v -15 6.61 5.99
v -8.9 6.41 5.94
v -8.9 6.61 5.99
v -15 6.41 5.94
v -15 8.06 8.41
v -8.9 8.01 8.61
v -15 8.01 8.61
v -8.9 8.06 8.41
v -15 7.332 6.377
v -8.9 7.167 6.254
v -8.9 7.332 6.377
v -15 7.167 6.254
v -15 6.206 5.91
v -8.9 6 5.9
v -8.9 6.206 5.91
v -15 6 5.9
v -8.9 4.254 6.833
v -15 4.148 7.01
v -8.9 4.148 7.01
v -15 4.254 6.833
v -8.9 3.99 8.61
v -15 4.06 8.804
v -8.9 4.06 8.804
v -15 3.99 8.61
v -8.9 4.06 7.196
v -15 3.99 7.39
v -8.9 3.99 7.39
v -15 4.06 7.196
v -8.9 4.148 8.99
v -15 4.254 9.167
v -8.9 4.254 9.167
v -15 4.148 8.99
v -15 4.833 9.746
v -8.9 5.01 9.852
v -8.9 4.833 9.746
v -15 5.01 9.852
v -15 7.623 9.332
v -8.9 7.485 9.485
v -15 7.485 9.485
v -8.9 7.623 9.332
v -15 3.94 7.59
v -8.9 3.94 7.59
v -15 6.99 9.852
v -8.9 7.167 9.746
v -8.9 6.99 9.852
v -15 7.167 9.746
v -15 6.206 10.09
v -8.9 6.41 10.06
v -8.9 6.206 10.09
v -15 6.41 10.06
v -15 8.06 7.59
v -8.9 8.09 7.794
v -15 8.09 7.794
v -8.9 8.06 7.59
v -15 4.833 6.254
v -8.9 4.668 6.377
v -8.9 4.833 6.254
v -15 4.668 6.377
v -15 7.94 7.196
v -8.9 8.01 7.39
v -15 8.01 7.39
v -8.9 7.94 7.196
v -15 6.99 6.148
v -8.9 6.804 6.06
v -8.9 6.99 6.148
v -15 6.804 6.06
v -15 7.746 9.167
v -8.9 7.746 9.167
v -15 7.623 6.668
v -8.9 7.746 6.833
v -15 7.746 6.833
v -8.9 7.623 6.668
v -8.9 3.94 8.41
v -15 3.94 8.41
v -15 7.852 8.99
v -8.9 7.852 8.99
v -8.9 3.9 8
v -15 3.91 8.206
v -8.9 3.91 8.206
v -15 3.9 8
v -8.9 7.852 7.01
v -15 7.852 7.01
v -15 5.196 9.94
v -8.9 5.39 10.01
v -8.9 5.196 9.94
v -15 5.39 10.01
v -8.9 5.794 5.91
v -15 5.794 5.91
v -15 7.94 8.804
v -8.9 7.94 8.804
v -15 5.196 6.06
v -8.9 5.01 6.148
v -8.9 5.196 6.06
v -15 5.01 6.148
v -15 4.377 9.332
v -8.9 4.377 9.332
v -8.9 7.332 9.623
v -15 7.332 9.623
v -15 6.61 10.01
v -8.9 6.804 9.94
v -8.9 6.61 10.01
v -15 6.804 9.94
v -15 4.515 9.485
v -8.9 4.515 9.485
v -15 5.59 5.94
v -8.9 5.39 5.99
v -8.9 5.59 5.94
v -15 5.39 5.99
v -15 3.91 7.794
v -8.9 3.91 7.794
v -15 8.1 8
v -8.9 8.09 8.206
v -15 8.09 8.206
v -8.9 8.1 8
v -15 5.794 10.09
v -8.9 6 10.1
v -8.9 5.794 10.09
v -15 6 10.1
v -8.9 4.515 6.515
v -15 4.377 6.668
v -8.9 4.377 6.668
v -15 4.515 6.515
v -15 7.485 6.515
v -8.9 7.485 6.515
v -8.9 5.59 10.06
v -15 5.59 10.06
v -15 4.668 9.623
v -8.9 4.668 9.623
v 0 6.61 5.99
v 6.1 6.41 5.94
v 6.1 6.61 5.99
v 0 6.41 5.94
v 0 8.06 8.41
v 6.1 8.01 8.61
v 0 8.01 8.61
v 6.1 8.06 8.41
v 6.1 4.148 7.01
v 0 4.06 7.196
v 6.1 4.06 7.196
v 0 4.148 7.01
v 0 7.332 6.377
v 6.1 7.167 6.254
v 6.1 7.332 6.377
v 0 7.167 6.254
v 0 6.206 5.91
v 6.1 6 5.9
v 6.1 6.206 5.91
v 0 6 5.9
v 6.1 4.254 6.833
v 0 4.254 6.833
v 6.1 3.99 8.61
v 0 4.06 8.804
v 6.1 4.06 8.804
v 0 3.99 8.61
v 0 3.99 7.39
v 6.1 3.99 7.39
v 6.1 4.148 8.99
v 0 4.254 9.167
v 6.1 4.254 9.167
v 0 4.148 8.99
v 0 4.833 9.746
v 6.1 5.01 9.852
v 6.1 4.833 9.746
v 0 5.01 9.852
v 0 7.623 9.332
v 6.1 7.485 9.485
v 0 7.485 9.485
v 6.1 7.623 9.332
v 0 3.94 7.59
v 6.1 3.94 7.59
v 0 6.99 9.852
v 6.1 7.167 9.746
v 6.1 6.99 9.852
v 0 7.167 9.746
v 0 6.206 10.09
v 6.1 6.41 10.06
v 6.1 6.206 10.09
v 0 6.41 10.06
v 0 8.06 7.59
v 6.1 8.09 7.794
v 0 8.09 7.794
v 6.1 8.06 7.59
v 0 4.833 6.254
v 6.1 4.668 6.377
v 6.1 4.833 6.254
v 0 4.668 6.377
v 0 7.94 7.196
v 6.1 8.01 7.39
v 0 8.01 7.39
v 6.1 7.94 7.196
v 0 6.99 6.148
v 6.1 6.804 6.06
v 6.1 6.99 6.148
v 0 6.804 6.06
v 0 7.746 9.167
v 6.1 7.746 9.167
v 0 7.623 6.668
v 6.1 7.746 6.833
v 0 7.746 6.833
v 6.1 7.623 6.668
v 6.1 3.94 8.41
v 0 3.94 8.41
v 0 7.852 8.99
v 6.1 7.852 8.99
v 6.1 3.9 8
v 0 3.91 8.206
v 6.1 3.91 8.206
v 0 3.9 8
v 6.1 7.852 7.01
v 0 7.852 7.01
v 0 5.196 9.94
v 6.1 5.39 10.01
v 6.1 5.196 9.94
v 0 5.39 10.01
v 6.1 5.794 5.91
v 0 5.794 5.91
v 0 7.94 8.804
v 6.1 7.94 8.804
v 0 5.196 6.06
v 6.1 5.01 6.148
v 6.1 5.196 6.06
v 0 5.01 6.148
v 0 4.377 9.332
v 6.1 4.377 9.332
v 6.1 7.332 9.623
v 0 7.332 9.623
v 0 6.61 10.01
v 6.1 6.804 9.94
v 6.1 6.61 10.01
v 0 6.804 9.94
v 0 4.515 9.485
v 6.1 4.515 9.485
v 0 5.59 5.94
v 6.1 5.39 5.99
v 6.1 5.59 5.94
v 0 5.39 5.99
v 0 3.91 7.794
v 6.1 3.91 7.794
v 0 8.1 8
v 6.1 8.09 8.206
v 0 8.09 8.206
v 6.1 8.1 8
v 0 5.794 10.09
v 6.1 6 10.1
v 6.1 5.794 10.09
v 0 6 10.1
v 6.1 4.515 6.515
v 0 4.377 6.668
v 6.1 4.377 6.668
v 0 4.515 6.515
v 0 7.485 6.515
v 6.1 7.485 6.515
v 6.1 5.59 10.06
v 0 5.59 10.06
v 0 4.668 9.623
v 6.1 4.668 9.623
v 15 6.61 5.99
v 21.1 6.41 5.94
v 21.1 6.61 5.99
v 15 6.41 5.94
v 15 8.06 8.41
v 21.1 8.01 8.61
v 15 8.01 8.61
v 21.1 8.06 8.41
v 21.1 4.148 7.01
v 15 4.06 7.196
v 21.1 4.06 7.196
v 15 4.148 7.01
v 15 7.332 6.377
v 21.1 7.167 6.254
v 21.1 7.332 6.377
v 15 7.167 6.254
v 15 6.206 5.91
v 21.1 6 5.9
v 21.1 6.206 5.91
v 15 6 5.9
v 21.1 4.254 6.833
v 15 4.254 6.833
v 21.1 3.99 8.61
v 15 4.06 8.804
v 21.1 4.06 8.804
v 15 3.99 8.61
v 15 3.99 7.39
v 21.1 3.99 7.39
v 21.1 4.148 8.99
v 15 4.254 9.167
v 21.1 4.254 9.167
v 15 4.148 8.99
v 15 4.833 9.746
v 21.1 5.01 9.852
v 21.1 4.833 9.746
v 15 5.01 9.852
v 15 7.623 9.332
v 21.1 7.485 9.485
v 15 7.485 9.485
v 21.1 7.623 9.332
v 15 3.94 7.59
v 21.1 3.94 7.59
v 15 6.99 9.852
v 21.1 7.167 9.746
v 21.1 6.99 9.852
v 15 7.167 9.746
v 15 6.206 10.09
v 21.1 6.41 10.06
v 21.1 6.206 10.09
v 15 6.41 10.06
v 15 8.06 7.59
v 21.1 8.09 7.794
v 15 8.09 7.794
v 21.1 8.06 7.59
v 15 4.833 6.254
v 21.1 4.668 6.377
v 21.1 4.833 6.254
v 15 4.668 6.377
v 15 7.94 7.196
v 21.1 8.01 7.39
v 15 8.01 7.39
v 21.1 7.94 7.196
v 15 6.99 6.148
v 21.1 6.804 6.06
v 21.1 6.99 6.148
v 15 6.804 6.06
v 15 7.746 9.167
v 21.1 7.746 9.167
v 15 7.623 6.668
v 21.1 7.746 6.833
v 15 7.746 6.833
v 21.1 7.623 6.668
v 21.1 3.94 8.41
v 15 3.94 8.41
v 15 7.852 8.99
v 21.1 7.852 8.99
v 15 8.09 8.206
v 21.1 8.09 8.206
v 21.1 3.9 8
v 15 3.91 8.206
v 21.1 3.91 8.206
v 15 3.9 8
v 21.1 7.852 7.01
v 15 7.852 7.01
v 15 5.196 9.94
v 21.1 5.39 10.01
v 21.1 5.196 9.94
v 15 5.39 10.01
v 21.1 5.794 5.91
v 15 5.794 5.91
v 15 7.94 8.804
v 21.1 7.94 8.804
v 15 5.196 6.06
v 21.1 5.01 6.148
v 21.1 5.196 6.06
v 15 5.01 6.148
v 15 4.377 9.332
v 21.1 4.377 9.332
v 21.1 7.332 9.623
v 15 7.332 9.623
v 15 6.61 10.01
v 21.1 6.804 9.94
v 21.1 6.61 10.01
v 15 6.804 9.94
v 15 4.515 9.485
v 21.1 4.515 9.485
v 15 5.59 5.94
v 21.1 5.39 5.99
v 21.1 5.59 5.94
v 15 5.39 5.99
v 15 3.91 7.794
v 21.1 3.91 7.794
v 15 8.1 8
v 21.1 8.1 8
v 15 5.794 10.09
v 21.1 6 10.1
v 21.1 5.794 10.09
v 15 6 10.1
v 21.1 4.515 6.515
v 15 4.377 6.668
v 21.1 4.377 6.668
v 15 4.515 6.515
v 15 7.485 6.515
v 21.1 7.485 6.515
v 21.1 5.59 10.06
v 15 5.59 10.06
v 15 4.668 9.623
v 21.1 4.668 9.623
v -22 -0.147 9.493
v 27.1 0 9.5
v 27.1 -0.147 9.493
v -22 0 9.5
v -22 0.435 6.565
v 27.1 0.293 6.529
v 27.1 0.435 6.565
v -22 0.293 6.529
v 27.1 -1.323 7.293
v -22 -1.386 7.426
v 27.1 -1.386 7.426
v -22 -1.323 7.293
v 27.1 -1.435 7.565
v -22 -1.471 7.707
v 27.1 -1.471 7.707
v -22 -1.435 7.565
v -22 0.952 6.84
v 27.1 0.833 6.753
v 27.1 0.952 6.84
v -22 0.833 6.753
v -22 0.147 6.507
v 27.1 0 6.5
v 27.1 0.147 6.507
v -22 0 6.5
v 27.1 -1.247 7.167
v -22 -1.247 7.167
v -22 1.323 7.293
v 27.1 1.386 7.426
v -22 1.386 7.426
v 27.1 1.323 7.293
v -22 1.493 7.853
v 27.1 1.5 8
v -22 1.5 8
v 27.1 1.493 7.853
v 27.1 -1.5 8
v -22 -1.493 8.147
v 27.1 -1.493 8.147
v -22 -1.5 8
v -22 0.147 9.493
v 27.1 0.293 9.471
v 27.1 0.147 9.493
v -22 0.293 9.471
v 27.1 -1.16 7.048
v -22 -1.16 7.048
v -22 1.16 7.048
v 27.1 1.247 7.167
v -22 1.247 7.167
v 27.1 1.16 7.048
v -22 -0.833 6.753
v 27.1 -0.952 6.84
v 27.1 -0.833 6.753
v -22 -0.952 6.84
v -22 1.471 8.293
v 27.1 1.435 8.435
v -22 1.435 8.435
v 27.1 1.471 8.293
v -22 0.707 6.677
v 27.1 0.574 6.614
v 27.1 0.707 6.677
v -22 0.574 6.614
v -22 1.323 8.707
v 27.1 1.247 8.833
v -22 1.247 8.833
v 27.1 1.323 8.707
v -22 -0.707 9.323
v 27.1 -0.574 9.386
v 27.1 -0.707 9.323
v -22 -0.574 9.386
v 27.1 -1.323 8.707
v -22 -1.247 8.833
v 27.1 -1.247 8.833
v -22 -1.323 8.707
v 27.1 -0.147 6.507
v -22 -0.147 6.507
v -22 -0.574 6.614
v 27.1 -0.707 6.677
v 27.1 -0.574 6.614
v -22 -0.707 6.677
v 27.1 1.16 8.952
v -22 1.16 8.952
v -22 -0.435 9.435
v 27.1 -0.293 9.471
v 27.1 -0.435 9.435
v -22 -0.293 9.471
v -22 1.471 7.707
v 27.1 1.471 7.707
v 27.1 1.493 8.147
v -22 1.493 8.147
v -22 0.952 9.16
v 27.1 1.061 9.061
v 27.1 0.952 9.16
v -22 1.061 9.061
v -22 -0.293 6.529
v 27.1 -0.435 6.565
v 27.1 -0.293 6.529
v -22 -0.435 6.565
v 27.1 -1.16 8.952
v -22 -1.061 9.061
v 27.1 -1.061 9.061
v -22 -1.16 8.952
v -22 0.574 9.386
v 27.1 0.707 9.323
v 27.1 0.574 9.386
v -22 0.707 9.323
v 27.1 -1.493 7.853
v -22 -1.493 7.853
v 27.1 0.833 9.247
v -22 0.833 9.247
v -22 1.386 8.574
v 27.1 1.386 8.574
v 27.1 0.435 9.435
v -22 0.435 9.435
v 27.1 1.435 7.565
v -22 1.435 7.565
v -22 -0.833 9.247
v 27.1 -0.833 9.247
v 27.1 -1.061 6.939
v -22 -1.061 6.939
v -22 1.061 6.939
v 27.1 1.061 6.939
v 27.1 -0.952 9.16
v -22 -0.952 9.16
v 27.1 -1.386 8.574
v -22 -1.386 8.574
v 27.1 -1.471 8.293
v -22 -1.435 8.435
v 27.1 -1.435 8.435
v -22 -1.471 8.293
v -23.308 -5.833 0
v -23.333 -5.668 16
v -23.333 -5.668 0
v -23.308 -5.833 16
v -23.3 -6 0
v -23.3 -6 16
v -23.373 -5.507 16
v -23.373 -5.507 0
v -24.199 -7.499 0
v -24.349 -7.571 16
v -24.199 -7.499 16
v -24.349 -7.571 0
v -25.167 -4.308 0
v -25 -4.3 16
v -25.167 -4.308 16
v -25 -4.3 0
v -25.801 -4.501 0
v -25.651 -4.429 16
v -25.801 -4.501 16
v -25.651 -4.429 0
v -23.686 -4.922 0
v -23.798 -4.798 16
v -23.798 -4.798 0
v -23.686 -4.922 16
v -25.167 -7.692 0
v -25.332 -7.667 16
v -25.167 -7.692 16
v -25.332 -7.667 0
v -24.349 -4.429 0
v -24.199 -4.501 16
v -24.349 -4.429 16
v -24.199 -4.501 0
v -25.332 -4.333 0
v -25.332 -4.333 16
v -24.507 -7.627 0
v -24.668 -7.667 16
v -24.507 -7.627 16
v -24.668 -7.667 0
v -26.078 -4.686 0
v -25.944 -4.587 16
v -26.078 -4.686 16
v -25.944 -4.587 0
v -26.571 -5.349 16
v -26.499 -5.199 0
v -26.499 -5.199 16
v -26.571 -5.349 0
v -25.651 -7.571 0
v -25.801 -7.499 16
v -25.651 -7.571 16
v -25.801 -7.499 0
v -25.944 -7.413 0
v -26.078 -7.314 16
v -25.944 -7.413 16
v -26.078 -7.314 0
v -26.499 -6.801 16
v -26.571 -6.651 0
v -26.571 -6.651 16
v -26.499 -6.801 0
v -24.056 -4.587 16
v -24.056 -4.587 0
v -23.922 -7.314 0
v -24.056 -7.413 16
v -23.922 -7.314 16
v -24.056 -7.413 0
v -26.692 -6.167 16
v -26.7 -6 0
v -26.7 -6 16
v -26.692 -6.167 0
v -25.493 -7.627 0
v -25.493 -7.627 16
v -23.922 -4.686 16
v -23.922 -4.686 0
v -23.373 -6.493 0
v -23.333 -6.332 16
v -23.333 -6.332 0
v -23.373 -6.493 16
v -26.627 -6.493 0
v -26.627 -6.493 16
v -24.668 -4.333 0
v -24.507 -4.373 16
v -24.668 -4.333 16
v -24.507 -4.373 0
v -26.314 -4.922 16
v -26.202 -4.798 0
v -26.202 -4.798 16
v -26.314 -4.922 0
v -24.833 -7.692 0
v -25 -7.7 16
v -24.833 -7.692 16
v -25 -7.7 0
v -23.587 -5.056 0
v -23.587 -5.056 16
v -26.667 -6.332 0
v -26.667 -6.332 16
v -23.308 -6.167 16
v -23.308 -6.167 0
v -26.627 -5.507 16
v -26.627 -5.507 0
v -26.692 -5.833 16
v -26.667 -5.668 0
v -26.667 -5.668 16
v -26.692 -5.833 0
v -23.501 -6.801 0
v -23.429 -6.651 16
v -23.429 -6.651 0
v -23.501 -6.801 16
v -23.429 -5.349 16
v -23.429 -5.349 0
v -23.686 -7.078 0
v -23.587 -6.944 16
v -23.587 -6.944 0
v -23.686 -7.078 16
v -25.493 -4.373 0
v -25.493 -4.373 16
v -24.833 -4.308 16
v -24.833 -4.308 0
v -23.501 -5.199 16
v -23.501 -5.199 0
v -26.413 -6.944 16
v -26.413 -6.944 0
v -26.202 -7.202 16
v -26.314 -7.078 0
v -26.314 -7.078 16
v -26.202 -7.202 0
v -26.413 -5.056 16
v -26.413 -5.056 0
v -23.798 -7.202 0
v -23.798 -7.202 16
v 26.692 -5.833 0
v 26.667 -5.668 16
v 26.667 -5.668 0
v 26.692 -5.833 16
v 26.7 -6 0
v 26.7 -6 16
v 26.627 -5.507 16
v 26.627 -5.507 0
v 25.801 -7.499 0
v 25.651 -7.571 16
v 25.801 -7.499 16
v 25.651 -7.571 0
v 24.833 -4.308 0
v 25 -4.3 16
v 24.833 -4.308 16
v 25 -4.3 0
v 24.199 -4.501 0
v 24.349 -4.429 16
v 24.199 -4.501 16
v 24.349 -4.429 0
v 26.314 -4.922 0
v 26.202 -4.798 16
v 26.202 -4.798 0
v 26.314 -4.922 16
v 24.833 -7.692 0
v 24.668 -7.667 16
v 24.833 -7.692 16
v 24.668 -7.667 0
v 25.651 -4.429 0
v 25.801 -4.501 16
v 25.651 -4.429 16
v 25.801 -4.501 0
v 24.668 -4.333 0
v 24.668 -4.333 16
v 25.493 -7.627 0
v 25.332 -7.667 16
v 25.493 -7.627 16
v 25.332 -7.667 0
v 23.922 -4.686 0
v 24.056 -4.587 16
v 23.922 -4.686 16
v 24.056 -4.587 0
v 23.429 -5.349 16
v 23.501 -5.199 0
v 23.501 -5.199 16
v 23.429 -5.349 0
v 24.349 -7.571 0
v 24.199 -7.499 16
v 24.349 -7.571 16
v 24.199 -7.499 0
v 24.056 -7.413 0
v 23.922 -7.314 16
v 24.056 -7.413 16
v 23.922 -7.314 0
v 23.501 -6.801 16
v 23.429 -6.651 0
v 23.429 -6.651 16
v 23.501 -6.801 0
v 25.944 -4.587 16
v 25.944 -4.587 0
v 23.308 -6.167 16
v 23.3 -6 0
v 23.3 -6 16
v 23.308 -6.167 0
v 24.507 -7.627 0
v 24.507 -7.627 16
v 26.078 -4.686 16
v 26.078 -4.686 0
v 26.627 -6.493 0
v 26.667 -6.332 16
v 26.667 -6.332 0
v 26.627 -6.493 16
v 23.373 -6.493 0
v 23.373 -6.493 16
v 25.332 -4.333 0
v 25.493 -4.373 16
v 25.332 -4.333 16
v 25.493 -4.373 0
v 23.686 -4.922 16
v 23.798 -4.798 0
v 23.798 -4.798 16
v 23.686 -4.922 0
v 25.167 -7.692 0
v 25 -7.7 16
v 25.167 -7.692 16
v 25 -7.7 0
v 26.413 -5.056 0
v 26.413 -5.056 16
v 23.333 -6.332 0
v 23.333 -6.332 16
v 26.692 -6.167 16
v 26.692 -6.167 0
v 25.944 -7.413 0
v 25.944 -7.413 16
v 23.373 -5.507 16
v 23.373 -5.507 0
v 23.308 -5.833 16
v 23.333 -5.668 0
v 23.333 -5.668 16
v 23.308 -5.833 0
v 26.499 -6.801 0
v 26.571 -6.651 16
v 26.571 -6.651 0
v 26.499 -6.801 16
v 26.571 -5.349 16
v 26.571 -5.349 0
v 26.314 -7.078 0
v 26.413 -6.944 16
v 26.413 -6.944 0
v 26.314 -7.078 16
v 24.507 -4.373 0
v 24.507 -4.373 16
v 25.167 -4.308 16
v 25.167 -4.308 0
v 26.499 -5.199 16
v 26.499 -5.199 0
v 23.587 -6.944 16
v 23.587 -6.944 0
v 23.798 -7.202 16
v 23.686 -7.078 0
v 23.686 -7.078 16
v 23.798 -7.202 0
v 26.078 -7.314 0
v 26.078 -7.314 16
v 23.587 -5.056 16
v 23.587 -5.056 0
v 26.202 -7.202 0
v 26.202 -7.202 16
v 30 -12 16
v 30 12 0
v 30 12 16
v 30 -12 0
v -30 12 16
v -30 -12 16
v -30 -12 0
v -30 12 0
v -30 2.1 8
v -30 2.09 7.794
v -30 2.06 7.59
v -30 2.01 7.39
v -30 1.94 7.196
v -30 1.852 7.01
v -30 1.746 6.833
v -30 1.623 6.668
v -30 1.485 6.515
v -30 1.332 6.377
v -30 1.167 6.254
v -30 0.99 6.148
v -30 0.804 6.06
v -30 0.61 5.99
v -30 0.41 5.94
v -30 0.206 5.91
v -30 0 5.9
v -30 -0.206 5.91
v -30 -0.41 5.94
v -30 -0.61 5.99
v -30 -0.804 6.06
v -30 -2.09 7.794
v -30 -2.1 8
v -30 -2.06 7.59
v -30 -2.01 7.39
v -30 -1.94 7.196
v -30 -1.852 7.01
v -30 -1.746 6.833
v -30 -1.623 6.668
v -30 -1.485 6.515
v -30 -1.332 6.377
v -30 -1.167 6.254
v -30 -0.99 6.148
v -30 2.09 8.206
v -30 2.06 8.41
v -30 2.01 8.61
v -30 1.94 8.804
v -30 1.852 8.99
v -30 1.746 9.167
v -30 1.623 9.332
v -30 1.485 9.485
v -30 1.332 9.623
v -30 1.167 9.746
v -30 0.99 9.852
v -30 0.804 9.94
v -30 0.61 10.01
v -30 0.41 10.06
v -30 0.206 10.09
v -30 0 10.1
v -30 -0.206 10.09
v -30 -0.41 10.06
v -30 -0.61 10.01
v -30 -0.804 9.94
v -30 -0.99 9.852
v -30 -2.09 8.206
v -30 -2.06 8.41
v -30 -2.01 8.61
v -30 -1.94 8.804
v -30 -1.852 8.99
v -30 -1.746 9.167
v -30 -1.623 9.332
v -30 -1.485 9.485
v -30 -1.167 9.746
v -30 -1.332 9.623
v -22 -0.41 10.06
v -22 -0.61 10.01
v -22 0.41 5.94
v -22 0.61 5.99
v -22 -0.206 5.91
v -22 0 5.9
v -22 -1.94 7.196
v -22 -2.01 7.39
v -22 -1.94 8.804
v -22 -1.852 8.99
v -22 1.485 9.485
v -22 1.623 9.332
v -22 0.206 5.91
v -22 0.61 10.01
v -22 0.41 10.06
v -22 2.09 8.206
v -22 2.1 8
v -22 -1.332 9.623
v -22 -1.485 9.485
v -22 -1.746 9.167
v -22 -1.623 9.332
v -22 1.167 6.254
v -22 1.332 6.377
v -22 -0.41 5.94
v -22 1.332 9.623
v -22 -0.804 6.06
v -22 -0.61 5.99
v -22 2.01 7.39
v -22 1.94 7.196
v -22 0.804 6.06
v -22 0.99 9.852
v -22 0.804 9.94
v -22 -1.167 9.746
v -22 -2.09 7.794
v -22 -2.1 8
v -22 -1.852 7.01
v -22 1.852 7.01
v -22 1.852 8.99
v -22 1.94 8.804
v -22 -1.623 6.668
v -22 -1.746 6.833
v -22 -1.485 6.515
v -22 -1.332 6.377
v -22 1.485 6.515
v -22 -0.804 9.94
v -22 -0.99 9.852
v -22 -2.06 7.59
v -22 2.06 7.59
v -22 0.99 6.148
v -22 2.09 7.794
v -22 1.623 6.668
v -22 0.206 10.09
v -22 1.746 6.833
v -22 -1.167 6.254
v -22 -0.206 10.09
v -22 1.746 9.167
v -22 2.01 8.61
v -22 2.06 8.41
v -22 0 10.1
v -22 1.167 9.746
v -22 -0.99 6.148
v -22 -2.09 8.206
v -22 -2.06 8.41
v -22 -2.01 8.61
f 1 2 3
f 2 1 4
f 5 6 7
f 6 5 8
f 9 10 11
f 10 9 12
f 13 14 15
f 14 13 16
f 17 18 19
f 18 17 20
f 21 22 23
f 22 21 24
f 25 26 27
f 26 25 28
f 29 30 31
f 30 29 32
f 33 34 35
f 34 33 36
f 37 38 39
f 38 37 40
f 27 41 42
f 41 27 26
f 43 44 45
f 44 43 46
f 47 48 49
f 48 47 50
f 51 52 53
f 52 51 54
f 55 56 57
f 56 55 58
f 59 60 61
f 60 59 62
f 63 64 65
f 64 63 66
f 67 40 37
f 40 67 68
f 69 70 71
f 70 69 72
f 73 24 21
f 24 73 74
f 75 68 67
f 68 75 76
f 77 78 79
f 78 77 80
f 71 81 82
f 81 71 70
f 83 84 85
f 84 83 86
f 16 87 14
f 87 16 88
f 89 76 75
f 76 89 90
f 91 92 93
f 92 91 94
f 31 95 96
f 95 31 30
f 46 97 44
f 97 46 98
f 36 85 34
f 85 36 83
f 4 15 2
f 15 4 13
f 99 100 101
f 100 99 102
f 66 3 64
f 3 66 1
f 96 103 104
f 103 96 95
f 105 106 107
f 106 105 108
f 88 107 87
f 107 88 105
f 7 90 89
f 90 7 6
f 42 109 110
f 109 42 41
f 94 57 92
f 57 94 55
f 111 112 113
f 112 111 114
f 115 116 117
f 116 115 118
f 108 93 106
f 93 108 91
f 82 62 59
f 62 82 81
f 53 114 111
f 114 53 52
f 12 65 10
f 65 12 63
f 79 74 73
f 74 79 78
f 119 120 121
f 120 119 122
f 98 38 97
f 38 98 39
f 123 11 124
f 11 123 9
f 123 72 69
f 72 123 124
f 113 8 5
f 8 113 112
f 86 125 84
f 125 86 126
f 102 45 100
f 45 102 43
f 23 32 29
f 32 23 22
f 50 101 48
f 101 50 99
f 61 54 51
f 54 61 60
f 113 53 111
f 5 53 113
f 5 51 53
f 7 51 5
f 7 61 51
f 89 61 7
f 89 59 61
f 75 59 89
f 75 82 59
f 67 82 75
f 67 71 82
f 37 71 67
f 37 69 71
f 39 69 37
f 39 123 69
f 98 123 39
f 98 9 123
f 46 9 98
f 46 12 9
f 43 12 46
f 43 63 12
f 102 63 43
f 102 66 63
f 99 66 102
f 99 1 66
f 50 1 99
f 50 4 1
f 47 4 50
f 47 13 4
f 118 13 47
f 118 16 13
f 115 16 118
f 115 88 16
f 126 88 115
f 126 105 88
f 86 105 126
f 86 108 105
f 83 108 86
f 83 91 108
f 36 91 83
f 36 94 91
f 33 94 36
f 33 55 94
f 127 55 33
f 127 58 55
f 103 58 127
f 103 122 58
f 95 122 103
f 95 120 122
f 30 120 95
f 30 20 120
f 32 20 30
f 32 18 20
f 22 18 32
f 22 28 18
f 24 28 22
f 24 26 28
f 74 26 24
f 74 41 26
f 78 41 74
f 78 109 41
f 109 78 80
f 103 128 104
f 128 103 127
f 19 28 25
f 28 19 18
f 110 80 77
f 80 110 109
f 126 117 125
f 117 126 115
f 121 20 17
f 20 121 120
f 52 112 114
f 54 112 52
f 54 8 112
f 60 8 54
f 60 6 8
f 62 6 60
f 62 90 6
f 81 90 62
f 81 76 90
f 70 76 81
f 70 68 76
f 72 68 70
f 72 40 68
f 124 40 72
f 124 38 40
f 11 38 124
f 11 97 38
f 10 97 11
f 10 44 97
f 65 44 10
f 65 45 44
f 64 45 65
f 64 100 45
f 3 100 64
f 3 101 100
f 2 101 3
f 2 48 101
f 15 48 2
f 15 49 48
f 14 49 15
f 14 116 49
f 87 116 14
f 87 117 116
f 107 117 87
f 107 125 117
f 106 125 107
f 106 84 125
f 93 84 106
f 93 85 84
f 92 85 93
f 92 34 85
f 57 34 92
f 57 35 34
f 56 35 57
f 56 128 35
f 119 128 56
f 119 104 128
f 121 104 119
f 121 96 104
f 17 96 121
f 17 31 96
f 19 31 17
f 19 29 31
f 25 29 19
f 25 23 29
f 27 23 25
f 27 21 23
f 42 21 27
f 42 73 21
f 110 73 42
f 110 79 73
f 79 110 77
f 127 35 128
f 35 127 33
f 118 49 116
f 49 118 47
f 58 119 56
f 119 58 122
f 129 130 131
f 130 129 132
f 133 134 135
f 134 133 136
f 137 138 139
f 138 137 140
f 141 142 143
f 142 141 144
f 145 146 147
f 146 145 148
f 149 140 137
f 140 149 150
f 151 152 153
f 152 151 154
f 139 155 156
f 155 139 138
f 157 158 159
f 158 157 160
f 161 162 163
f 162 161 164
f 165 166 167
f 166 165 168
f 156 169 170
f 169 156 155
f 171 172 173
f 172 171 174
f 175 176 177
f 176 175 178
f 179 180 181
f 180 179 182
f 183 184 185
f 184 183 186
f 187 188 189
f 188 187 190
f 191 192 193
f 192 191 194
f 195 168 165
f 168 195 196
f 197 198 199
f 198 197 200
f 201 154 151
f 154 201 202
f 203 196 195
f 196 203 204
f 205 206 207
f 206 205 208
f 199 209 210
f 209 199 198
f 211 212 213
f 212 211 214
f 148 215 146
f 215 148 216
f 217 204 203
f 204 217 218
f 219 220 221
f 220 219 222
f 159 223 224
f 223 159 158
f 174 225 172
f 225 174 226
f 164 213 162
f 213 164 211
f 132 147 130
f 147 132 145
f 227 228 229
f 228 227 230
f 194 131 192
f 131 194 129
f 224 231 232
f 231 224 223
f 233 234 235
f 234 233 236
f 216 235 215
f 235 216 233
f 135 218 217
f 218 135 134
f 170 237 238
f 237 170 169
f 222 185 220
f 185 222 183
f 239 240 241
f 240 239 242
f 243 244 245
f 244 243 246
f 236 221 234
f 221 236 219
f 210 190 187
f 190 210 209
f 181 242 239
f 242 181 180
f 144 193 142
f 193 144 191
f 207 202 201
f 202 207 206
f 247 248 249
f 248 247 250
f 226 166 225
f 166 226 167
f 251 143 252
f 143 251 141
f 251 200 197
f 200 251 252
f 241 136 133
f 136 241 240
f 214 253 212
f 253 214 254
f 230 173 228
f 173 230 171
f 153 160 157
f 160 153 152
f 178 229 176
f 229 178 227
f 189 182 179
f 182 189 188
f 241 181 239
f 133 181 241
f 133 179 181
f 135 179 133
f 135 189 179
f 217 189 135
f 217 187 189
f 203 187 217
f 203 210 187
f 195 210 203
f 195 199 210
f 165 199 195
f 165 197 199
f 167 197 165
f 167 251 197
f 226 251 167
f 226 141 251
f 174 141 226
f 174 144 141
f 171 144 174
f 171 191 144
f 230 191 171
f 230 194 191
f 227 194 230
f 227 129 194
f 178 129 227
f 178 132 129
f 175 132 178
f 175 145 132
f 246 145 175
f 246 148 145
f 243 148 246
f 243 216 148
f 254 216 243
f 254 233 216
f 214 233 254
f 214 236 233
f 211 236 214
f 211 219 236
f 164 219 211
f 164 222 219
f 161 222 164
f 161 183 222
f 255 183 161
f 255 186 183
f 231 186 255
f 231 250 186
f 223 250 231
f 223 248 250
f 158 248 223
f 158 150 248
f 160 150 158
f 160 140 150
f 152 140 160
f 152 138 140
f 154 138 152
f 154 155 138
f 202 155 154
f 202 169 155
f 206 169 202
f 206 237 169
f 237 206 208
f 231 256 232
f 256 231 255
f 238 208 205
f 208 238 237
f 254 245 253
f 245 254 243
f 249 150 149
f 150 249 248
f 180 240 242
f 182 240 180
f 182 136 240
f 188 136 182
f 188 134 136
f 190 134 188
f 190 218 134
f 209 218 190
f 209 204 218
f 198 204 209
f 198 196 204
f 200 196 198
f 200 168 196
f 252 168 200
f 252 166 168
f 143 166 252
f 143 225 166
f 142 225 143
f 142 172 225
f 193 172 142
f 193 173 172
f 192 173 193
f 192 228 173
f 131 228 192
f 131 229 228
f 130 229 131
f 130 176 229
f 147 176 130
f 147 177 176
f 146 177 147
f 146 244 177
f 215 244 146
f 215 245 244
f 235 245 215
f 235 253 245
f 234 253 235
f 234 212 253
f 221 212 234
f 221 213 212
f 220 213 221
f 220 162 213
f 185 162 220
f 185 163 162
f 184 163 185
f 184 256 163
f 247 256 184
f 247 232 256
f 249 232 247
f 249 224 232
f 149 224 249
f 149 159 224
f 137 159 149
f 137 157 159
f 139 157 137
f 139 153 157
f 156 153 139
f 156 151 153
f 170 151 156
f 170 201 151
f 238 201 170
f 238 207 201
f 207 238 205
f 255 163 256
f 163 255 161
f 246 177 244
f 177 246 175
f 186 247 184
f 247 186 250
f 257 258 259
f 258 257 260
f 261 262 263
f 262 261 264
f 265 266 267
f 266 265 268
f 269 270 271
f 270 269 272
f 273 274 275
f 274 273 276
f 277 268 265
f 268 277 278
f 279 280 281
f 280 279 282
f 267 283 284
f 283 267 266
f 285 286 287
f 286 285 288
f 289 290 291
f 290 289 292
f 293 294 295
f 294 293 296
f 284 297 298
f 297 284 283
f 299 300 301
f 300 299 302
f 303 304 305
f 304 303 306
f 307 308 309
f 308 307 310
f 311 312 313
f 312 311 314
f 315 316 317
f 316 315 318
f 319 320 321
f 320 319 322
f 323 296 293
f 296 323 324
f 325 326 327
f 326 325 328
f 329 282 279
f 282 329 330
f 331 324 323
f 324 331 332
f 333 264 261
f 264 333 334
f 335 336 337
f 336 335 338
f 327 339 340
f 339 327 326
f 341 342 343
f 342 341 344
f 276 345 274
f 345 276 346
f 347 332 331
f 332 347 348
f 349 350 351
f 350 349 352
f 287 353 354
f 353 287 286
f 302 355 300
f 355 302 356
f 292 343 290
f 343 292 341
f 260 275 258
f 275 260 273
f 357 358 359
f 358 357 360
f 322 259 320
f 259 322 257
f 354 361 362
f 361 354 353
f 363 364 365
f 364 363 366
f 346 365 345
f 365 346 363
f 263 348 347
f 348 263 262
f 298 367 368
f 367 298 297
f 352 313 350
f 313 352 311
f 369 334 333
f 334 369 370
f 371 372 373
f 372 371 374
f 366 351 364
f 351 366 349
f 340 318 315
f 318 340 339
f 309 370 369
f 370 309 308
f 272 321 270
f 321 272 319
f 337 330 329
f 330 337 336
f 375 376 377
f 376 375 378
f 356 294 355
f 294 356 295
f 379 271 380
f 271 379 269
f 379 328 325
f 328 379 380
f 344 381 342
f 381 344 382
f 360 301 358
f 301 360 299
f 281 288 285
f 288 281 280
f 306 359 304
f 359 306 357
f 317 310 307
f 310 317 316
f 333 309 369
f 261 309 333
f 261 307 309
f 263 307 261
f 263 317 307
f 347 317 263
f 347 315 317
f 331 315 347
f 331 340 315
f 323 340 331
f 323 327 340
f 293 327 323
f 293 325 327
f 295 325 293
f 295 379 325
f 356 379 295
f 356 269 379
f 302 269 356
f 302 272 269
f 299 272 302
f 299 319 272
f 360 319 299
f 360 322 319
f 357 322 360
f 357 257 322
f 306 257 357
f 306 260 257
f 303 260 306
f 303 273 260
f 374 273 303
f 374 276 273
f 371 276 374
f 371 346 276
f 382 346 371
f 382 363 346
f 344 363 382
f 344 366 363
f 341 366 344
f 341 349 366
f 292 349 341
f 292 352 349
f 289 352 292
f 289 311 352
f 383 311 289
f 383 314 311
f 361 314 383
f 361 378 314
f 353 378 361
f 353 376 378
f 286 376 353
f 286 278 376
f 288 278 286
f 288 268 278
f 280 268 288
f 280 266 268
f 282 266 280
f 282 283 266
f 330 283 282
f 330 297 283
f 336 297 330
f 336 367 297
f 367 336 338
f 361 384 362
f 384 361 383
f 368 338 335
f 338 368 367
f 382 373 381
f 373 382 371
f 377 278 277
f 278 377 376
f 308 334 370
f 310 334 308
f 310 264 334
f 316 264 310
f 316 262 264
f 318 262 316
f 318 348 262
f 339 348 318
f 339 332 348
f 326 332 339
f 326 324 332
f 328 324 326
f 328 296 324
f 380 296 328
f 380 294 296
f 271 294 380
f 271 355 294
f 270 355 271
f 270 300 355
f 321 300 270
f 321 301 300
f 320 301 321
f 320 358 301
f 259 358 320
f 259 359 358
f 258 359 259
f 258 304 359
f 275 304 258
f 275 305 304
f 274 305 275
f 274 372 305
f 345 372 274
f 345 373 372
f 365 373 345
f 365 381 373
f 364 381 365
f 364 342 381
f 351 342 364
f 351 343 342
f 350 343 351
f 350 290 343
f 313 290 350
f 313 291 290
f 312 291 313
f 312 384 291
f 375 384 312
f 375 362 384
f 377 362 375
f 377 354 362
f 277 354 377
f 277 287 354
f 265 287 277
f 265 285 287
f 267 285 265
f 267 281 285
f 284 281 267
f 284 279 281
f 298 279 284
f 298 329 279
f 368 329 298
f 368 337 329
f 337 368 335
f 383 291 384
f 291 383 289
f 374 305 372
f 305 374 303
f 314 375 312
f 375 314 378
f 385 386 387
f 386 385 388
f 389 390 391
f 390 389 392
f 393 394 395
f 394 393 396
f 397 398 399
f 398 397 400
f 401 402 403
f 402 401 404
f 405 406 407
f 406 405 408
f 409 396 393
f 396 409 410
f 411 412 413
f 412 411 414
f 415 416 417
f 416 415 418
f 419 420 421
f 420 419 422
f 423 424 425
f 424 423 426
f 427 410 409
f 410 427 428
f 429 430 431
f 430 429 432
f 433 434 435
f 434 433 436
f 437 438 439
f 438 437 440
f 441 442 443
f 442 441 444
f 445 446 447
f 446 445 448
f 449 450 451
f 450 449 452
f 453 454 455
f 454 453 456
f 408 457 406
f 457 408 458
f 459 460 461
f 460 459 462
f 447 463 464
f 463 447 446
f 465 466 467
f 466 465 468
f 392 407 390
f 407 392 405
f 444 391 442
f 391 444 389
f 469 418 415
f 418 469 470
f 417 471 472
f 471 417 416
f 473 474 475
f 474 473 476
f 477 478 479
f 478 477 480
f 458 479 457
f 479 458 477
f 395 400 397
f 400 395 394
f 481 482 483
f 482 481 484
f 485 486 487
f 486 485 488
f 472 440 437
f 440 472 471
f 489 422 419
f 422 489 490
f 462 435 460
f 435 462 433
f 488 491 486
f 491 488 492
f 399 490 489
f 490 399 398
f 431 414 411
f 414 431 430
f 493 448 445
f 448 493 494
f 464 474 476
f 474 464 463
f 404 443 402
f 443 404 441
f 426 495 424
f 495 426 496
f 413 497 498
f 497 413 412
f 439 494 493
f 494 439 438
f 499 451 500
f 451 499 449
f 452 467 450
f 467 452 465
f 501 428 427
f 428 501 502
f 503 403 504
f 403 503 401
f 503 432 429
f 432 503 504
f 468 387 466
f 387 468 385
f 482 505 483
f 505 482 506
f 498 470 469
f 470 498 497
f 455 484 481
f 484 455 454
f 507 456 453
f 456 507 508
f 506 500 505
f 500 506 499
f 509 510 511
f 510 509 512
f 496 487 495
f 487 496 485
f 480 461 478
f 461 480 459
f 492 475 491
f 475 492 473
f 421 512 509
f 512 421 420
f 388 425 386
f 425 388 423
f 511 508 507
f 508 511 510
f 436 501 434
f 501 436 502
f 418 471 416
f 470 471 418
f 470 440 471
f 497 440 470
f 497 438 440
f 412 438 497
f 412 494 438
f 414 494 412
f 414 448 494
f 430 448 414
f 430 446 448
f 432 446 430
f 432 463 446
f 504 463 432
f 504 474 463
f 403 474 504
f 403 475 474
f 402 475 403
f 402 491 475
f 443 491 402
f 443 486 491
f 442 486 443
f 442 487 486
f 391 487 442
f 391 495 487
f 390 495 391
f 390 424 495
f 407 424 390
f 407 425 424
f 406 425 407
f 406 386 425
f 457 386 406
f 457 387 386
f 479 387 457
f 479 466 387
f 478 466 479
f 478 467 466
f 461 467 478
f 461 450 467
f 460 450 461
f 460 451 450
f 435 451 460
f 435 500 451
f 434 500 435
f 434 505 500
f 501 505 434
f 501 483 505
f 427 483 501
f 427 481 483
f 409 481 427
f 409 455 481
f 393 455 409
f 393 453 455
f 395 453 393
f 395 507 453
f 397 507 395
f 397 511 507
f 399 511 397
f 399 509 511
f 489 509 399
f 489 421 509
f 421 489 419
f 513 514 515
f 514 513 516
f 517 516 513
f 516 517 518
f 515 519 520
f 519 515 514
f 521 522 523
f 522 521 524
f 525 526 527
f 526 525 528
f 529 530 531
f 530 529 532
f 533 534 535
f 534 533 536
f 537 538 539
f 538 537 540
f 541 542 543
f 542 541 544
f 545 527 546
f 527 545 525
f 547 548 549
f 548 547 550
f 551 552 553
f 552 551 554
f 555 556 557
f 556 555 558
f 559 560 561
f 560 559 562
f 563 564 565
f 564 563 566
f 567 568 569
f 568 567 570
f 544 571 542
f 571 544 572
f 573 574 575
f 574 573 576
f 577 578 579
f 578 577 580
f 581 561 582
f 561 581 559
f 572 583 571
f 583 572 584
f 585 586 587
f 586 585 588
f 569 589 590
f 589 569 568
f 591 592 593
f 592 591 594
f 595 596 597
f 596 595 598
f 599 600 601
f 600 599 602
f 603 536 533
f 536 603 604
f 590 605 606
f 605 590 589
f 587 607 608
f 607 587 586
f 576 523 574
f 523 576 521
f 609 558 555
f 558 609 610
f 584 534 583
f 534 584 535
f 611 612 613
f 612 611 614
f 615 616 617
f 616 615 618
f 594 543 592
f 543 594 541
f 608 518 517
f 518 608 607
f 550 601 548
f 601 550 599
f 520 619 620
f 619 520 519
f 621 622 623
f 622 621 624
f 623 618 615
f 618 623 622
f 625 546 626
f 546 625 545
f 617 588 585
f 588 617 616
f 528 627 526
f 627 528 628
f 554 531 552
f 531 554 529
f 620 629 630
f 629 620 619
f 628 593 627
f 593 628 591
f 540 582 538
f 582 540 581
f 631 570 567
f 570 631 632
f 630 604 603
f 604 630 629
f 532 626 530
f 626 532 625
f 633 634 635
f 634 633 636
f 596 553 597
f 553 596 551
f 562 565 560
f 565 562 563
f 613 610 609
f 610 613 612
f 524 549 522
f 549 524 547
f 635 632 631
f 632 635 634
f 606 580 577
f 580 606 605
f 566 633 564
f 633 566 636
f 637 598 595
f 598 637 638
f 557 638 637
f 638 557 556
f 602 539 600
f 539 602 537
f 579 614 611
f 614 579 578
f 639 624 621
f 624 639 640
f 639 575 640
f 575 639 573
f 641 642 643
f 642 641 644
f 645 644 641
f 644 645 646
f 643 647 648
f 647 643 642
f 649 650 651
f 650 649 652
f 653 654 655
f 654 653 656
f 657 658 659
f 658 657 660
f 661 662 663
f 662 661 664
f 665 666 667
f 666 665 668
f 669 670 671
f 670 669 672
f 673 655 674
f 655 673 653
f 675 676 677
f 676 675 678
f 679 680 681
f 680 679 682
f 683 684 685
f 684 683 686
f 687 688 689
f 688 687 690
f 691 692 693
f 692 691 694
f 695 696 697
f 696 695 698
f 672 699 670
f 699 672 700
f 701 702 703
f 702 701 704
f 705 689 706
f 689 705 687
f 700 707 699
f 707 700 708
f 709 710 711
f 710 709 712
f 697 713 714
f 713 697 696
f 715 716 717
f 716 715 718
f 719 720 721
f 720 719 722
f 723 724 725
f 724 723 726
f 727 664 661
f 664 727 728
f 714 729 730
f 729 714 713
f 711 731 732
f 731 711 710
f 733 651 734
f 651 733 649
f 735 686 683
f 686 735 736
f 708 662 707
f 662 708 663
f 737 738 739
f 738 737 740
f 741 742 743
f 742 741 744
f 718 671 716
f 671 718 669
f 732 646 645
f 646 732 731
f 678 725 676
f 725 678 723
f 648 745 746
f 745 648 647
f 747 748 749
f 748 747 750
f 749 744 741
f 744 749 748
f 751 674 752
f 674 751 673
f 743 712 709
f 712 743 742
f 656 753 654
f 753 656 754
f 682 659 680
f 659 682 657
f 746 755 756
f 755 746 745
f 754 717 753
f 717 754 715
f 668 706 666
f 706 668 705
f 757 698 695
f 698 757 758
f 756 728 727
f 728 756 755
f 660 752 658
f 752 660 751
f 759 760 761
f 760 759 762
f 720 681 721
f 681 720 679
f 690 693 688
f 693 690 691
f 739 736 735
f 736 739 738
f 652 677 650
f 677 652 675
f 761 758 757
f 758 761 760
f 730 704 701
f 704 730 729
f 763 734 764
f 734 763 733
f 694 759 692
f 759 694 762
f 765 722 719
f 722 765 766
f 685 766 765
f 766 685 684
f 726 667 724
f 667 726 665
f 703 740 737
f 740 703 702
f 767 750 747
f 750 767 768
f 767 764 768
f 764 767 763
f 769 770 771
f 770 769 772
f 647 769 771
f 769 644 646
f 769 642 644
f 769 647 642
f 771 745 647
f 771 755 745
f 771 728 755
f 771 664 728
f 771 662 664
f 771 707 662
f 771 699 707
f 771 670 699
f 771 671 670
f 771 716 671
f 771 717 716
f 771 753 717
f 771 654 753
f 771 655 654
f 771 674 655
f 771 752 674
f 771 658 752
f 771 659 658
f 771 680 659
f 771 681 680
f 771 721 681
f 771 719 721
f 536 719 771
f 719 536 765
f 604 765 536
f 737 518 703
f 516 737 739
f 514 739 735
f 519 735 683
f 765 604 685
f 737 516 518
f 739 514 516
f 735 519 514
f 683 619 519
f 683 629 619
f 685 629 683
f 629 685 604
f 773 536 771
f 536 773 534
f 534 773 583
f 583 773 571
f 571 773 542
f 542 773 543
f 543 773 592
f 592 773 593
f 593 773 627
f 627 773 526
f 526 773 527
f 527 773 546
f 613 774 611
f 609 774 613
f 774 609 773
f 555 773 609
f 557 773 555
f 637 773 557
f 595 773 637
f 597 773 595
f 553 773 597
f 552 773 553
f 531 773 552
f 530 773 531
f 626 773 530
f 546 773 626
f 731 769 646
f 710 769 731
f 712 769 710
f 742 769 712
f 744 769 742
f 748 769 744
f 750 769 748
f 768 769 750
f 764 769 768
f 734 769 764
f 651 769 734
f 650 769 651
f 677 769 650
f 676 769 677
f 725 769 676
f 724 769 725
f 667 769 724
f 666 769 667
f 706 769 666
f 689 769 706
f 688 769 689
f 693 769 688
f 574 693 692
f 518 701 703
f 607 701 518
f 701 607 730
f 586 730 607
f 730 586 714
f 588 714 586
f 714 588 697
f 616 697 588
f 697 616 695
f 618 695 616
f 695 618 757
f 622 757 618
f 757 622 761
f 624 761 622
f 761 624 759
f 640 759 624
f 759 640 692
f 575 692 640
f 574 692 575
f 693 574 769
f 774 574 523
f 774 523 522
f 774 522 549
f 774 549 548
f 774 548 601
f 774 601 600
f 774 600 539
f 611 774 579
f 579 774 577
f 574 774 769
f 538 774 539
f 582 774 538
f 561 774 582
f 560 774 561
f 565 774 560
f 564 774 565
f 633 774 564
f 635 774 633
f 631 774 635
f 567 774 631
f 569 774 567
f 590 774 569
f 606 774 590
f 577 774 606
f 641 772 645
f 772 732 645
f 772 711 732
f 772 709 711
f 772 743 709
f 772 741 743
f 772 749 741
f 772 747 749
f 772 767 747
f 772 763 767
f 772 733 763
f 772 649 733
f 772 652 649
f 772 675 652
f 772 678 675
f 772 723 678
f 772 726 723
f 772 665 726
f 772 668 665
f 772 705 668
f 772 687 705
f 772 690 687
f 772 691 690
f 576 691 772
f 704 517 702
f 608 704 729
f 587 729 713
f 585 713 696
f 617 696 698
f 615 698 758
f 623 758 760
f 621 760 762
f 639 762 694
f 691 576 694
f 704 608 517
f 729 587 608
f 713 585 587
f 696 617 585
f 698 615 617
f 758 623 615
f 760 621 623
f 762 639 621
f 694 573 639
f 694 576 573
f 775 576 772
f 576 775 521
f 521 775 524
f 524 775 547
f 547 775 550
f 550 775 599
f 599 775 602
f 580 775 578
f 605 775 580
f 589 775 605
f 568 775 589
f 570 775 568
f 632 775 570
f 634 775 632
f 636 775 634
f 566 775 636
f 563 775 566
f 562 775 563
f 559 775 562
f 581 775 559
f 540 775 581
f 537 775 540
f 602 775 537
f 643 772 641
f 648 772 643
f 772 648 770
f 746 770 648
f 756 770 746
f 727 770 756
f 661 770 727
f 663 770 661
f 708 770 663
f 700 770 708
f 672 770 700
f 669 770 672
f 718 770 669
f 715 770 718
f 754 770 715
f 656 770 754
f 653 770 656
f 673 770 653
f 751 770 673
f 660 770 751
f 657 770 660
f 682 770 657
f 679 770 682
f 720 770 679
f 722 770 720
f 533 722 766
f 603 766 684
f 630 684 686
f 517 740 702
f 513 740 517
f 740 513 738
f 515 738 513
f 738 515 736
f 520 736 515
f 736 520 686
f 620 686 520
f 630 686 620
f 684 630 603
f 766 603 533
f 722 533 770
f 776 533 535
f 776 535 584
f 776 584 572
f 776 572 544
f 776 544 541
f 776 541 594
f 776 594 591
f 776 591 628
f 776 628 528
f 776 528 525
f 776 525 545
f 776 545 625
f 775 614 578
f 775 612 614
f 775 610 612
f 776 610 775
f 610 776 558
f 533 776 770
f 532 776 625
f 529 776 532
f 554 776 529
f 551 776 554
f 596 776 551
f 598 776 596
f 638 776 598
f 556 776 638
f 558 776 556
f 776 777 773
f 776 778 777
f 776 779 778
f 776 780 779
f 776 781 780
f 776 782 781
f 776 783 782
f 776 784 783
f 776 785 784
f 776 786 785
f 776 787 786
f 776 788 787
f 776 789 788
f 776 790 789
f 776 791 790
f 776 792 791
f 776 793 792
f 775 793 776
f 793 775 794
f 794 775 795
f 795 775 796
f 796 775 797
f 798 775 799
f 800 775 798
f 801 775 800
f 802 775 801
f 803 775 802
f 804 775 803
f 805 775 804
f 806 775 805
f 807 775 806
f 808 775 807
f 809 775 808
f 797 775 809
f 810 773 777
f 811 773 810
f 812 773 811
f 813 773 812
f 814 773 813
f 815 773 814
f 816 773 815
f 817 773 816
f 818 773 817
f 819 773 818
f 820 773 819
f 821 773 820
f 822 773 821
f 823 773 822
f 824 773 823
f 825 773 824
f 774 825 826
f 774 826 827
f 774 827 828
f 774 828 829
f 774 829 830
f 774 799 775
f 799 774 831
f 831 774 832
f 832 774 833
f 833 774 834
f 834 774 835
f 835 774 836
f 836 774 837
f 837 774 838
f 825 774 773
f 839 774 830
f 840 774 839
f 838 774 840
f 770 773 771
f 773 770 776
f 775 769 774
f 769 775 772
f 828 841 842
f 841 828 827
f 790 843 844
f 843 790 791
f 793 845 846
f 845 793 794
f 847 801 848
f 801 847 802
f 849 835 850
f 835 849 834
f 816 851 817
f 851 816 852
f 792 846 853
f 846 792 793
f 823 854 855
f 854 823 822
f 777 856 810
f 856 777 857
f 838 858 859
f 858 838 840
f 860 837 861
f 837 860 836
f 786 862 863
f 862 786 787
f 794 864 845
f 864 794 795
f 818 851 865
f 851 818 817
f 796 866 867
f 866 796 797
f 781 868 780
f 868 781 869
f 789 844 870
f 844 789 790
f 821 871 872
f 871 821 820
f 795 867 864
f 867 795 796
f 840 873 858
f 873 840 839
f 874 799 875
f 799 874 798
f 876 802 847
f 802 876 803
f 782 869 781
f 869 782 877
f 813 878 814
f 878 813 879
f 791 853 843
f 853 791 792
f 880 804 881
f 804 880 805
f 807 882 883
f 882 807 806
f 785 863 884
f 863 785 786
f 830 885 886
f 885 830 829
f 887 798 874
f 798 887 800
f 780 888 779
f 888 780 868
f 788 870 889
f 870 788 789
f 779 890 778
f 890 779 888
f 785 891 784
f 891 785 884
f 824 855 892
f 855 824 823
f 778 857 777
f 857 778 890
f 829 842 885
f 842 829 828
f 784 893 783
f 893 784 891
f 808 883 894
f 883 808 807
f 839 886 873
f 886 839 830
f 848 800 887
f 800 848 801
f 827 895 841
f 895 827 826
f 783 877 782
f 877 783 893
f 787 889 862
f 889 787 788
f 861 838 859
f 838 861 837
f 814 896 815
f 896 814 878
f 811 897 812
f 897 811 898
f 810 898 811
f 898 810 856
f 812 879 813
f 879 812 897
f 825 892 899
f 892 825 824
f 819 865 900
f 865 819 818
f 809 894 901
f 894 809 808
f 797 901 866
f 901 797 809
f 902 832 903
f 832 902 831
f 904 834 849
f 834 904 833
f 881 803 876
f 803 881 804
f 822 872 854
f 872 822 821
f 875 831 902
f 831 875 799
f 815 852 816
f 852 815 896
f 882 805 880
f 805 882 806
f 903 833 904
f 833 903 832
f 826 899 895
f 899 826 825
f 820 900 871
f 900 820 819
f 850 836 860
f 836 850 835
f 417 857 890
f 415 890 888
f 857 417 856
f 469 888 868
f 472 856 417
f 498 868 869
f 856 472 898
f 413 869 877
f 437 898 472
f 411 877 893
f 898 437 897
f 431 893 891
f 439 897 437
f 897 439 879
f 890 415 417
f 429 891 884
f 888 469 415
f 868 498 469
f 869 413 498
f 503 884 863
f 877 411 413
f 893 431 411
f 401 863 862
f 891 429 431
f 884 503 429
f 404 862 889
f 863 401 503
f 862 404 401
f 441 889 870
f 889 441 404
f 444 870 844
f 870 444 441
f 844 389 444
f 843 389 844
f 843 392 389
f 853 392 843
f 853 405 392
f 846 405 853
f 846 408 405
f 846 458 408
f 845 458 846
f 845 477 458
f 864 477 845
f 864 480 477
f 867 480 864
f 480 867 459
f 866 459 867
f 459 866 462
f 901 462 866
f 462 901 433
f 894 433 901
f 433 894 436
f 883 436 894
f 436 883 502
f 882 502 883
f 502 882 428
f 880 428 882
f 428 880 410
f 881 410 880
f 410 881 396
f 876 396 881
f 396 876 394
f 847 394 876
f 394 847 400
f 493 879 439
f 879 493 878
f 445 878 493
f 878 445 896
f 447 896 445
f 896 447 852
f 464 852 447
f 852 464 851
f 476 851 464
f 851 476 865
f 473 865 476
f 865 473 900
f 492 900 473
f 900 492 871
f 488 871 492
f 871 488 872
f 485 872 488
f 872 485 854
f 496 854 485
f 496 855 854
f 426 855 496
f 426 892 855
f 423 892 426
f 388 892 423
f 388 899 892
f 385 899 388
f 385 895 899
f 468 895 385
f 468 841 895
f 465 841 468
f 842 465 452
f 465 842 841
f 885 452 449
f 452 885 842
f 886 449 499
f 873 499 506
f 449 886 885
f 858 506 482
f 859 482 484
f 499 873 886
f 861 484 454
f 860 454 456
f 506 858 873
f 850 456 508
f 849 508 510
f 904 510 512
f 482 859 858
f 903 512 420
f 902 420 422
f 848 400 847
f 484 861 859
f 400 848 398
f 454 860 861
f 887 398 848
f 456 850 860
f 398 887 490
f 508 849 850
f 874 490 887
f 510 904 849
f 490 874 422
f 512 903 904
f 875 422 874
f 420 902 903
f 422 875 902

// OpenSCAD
// --- Dimensions (mm) ---
block_x = 60;           // Total length of block
block_y = 24;           // Total width of block
block_z = 16;           // Total height of block

channel_dia = 3.0;      // Diameter of internal channels
socket_dia = 4.2;       // Diameter of tubing sockets
socket_depth_in = 8.0;  // Depth of inlet socket
socket_depth_out = 6.0; // Depth of outlet sockets

inlet_x_pos = -30;       // Center of -X face (60/2)
inlet_y_pos = 0;         // Offset from center Y
inlet_z_pos = 8;         // Mid-plane Z

outlet_x_coords = [-15, 0, 15]; // X positions of the three outlets
outlet_z_pos = 8;        // Mid-plane Z

screw_hole_dia = 3.4;    // Diameter for M3 screws
screw_x_coords = [-25, 25]; // X positions of screw holes
screw_y_pos = -6;        // Y position of screw holes

// --- Parameters ---
$fn = 64;

// --- Main Block ---
difference() {
    // The solid block
    // Centered on X and Y, resting on Z=0
    translate([-block_x/2, -block_y/2, 0])
        cube([block_x, block_y, block_z]);

    // 1. Inlet Socket (-X face, Y=0)
    // User: "inlet, on the -X end face at y = 0, is a 4.2 mm socket 8 mm deep"
    // The -X face is at x = -30.
    translate([-block_x/2 - 0.1, inlet_y_pos, inlet_z_pos])
        rotate([0, 90, 0])
            cylinder(h = socket_depth_in + 0.1, d = socket_dia);

    // 2. Main Channel (Inlet to x=15)
    // User: "from it [the inlet] the main channel runs along X to x = 15, where it stops, closed, inside the block."
    // The inlet is at x = -30. The channel ends at x = 15.
    // Length = 15 - (-30) = 45mm.
    translate([-block_x/2, inlet_y_pos, inlet_z_pos])
        rotate([0, 90, 0])
            cylinder(h = 45 + 0.1, d = channel_dia);

    // 3. Outlet Sockets (+Y face)
    // User: "Three outlet channels branch off it at x = -15, 0 and 15 and run in the +Y direction to the +Y face, each ending there in a 4.2 mm socket 6 mm deep."
    // The +Y face is at y = 12.
    for (x_pos = outlet_x_coords) {
        translate([x_pos, block_y/2 - socket_depth_out, outlet_z_pos])
            rotate([0, 90, 0])
                cylinder(h = socket_depth_out + 0.1, d = socket_dia);
    }

    // 4. Outlet Channels
    // These connect the main channel (at y=0) to the outlet sockets (at y=12).
    // Since the sockets are 6mm deep, they start at y = 12 - 6 = 6.
    // The channels must span from y=0 to y=6.
    for (x_pos = outlet_x_coords) {
        translate([x_pos, 0, outlet_z_pos])
            rotate([0, 90, 0])
                cylinder(h = block_y/2 + 0.1, d = channel_dia);
    }

    // 5. Screw Holes (Vertical through-holes)
    // User: "Two 3.4 mm vertical through-holes for M3 screws go through the block at x = -25 and 25, y = -6"
    for (x_pos = screw_x_coords) {
        translate([x_pos, screw_y_pos, -0.1])
            cylinder(h = block_z + 0.2, d = screw_hole_dia);
    }
}
